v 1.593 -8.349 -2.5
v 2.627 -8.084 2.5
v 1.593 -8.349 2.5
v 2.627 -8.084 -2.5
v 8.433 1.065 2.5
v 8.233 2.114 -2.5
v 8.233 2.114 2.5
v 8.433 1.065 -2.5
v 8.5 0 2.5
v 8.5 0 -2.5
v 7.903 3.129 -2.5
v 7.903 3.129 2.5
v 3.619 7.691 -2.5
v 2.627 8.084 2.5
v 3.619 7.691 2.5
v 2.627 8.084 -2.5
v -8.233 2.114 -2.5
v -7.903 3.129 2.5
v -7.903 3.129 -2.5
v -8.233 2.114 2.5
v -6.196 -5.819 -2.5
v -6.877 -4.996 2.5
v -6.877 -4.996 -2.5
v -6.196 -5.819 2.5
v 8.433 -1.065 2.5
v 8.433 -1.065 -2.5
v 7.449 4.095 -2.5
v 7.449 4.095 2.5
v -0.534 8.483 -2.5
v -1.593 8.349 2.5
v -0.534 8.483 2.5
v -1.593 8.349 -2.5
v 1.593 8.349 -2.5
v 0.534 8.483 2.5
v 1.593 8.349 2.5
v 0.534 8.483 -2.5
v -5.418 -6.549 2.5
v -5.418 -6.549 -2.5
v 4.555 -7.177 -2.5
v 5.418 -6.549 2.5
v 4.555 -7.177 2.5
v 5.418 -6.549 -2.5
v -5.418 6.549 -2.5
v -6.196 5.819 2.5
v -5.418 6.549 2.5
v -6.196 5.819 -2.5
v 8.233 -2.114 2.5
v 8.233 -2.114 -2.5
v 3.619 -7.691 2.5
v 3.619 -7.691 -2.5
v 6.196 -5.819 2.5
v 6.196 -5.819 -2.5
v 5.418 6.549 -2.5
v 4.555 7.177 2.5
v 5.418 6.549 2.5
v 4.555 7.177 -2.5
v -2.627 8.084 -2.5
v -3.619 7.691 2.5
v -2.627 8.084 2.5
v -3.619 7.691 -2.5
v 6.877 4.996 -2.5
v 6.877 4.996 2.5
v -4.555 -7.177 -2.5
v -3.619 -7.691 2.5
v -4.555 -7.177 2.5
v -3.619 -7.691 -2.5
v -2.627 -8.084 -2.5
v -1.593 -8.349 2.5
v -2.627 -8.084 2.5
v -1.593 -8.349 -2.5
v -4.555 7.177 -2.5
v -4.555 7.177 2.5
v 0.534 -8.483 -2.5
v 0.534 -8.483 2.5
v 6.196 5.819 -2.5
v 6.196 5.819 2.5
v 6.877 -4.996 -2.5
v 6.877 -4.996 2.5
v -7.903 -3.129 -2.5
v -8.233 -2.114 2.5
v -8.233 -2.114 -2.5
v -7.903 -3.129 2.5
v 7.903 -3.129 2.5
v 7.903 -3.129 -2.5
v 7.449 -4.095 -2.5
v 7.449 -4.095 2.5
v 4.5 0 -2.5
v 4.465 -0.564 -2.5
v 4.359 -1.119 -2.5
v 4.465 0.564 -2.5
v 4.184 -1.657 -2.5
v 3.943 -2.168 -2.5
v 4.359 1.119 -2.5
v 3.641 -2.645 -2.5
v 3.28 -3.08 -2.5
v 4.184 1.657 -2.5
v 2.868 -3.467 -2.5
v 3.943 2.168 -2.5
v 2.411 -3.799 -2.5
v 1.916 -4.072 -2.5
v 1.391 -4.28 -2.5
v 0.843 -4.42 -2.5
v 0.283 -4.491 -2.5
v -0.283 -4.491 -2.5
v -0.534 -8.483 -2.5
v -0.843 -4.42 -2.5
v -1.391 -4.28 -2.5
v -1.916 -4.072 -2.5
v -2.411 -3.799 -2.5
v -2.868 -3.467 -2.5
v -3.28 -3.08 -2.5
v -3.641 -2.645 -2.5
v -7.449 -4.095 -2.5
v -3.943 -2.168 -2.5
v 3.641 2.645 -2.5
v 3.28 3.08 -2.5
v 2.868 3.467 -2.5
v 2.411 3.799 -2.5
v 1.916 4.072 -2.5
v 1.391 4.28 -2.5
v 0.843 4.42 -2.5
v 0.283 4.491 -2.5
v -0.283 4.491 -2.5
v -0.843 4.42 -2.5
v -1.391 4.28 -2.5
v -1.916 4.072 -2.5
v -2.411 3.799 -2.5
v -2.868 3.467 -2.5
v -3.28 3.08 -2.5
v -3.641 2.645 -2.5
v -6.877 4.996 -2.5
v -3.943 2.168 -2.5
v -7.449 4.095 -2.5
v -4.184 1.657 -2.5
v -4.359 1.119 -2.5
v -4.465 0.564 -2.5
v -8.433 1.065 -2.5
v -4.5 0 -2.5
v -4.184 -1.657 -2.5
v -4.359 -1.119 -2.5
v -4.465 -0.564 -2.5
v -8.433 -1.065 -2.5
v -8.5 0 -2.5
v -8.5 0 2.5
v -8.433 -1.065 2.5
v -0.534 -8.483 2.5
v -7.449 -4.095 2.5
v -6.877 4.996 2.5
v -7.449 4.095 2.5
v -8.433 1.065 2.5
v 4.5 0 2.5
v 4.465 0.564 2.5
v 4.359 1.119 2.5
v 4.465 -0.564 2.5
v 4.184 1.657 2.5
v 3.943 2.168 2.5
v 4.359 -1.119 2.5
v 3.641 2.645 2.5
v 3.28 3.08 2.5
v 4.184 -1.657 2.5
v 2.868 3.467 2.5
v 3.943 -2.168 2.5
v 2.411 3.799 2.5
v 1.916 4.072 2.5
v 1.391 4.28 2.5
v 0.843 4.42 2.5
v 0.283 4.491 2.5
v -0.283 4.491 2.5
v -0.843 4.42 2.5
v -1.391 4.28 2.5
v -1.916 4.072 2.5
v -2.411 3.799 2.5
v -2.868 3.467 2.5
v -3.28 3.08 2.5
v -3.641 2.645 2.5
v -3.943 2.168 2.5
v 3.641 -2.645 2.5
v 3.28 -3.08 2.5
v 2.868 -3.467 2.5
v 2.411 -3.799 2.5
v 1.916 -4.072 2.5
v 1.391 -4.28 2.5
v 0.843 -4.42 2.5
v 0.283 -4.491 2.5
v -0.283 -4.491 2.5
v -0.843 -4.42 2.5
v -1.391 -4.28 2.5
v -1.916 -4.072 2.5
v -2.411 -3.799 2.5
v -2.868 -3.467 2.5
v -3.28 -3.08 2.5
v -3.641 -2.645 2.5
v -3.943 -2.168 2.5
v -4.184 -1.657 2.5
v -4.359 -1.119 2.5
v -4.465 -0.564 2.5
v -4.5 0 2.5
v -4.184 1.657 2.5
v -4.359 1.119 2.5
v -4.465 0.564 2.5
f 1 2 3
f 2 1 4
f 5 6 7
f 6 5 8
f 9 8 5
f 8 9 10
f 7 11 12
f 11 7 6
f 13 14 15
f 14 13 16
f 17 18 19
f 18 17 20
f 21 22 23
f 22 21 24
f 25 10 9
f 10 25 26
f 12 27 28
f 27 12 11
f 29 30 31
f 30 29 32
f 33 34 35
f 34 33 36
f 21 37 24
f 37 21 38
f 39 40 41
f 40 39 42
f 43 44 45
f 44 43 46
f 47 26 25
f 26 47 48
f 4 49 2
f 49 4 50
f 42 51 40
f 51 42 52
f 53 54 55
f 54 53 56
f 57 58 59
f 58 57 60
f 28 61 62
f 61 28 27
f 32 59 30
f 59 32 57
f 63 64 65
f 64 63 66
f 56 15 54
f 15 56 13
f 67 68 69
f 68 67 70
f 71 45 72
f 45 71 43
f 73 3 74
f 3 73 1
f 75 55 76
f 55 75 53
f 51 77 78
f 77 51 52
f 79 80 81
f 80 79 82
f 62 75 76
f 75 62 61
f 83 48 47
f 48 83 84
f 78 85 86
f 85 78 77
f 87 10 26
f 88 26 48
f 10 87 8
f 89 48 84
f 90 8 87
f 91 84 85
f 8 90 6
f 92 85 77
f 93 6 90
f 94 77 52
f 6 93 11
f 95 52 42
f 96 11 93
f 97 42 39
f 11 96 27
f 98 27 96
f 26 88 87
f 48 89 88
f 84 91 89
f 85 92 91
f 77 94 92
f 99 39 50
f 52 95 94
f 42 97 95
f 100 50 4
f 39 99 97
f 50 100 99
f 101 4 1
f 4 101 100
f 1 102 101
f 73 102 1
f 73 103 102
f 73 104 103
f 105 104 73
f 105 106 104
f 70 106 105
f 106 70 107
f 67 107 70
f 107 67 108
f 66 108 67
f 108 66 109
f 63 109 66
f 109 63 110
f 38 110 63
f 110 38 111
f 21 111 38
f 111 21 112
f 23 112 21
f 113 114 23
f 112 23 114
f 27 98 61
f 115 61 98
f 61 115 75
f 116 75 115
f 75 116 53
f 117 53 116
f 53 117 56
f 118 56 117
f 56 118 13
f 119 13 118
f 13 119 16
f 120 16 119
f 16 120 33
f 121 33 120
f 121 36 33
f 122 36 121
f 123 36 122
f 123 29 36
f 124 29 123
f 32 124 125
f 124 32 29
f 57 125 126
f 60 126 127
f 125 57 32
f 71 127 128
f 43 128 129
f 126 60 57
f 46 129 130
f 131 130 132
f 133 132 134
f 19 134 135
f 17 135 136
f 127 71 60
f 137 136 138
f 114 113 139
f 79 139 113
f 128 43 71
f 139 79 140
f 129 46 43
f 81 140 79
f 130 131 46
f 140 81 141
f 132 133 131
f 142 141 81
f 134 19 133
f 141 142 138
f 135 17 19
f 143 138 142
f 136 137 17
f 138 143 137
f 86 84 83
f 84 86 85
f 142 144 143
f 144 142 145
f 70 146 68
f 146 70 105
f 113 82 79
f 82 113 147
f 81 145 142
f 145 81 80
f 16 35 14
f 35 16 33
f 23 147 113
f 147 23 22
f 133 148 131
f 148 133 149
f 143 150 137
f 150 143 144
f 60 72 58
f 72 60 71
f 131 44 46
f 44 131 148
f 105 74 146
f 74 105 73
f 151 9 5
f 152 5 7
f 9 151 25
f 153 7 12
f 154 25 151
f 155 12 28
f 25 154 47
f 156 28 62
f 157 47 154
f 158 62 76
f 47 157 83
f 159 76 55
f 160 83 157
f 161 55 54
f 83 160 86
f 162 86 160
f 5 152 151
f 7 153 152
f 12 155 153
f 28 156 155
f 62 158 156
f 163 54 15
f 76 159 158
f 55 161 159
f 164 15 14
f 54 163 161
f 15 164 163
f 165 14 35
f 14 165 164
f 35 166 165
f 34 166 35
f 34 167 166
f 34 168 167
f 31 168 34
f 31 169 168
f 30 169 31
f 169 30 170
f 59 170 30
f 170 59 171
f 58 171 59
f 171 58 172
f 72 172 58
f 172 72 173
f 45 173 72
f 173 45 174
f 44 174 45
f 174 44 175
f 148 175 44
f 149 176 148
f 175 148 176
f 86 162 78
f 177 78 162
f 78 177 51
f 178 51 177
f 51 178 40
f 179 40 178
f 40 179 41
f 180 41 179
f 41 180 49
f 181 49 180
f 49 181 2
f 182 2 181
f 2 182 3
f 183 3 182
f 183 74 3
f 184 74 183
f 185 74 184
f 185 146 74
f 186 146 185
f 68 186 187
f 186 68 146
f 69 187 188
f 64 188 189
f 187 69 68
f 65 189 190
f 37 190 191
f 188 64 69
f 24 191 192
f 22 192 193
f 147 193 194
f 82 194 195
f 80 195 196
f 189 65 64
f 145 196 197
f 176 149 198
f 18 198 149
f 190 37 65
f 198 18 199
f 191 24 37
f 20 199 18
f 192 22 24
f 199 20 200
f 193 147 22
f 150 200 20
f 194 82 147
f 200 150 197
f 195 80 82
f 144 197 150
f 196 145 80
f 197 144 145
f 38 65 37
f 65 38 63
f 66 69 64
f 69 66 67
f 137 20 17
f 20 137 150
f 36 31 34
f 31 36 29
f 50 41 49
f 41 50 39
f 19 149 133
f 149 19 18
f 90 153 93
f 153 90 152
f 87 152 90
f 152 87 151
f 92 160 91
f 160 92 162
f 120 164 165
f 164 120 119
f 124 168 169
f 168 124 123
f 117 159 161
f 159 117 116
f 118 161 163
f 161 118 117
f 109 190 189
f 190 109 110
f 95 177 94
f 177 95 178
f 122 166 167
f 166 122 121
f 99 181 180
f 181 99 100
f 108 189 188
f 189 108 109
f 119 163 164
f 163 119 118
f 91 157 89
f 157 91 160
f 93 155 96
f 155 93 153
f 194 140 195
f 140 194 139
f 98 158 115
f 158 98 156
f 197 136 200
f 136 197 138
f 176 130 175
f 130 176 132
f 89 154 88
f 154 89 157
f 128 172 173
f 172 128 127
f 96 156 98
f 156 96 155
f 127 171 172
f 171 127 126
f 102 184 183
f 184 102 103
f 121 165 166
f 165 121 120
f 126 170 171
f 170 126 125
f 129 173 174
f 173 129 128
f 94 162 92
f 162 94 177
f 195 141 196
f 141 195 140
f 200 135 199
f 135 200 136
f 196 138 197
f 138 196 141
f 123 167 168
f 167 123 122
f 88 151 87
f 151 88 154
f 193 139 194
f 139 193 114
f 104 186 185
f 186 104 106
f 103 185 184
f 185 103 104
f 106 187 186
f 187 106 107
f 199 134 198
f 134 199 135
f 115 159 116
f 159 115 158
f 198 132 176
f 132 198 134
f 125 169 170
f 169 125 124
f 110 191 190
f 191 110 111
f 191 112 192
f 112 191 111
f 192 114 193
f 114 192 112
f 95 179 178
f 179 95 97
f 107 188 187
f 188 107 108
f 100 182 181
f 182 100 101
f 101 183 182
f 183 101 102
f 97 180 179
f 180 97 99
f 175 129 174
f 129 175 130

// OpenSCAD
$fn = 50;


difference() {
	union() {
		translate(v = [0, 0, -2.5000000000]) {
			cylinder(h = 5, r = 8.5000000000);
		}
	}
	union() {
		translate(v = [0, 0, -100.0000000000]) {
			cylinder(h = 200, r = 4.5000000000);
		}
	}
}
